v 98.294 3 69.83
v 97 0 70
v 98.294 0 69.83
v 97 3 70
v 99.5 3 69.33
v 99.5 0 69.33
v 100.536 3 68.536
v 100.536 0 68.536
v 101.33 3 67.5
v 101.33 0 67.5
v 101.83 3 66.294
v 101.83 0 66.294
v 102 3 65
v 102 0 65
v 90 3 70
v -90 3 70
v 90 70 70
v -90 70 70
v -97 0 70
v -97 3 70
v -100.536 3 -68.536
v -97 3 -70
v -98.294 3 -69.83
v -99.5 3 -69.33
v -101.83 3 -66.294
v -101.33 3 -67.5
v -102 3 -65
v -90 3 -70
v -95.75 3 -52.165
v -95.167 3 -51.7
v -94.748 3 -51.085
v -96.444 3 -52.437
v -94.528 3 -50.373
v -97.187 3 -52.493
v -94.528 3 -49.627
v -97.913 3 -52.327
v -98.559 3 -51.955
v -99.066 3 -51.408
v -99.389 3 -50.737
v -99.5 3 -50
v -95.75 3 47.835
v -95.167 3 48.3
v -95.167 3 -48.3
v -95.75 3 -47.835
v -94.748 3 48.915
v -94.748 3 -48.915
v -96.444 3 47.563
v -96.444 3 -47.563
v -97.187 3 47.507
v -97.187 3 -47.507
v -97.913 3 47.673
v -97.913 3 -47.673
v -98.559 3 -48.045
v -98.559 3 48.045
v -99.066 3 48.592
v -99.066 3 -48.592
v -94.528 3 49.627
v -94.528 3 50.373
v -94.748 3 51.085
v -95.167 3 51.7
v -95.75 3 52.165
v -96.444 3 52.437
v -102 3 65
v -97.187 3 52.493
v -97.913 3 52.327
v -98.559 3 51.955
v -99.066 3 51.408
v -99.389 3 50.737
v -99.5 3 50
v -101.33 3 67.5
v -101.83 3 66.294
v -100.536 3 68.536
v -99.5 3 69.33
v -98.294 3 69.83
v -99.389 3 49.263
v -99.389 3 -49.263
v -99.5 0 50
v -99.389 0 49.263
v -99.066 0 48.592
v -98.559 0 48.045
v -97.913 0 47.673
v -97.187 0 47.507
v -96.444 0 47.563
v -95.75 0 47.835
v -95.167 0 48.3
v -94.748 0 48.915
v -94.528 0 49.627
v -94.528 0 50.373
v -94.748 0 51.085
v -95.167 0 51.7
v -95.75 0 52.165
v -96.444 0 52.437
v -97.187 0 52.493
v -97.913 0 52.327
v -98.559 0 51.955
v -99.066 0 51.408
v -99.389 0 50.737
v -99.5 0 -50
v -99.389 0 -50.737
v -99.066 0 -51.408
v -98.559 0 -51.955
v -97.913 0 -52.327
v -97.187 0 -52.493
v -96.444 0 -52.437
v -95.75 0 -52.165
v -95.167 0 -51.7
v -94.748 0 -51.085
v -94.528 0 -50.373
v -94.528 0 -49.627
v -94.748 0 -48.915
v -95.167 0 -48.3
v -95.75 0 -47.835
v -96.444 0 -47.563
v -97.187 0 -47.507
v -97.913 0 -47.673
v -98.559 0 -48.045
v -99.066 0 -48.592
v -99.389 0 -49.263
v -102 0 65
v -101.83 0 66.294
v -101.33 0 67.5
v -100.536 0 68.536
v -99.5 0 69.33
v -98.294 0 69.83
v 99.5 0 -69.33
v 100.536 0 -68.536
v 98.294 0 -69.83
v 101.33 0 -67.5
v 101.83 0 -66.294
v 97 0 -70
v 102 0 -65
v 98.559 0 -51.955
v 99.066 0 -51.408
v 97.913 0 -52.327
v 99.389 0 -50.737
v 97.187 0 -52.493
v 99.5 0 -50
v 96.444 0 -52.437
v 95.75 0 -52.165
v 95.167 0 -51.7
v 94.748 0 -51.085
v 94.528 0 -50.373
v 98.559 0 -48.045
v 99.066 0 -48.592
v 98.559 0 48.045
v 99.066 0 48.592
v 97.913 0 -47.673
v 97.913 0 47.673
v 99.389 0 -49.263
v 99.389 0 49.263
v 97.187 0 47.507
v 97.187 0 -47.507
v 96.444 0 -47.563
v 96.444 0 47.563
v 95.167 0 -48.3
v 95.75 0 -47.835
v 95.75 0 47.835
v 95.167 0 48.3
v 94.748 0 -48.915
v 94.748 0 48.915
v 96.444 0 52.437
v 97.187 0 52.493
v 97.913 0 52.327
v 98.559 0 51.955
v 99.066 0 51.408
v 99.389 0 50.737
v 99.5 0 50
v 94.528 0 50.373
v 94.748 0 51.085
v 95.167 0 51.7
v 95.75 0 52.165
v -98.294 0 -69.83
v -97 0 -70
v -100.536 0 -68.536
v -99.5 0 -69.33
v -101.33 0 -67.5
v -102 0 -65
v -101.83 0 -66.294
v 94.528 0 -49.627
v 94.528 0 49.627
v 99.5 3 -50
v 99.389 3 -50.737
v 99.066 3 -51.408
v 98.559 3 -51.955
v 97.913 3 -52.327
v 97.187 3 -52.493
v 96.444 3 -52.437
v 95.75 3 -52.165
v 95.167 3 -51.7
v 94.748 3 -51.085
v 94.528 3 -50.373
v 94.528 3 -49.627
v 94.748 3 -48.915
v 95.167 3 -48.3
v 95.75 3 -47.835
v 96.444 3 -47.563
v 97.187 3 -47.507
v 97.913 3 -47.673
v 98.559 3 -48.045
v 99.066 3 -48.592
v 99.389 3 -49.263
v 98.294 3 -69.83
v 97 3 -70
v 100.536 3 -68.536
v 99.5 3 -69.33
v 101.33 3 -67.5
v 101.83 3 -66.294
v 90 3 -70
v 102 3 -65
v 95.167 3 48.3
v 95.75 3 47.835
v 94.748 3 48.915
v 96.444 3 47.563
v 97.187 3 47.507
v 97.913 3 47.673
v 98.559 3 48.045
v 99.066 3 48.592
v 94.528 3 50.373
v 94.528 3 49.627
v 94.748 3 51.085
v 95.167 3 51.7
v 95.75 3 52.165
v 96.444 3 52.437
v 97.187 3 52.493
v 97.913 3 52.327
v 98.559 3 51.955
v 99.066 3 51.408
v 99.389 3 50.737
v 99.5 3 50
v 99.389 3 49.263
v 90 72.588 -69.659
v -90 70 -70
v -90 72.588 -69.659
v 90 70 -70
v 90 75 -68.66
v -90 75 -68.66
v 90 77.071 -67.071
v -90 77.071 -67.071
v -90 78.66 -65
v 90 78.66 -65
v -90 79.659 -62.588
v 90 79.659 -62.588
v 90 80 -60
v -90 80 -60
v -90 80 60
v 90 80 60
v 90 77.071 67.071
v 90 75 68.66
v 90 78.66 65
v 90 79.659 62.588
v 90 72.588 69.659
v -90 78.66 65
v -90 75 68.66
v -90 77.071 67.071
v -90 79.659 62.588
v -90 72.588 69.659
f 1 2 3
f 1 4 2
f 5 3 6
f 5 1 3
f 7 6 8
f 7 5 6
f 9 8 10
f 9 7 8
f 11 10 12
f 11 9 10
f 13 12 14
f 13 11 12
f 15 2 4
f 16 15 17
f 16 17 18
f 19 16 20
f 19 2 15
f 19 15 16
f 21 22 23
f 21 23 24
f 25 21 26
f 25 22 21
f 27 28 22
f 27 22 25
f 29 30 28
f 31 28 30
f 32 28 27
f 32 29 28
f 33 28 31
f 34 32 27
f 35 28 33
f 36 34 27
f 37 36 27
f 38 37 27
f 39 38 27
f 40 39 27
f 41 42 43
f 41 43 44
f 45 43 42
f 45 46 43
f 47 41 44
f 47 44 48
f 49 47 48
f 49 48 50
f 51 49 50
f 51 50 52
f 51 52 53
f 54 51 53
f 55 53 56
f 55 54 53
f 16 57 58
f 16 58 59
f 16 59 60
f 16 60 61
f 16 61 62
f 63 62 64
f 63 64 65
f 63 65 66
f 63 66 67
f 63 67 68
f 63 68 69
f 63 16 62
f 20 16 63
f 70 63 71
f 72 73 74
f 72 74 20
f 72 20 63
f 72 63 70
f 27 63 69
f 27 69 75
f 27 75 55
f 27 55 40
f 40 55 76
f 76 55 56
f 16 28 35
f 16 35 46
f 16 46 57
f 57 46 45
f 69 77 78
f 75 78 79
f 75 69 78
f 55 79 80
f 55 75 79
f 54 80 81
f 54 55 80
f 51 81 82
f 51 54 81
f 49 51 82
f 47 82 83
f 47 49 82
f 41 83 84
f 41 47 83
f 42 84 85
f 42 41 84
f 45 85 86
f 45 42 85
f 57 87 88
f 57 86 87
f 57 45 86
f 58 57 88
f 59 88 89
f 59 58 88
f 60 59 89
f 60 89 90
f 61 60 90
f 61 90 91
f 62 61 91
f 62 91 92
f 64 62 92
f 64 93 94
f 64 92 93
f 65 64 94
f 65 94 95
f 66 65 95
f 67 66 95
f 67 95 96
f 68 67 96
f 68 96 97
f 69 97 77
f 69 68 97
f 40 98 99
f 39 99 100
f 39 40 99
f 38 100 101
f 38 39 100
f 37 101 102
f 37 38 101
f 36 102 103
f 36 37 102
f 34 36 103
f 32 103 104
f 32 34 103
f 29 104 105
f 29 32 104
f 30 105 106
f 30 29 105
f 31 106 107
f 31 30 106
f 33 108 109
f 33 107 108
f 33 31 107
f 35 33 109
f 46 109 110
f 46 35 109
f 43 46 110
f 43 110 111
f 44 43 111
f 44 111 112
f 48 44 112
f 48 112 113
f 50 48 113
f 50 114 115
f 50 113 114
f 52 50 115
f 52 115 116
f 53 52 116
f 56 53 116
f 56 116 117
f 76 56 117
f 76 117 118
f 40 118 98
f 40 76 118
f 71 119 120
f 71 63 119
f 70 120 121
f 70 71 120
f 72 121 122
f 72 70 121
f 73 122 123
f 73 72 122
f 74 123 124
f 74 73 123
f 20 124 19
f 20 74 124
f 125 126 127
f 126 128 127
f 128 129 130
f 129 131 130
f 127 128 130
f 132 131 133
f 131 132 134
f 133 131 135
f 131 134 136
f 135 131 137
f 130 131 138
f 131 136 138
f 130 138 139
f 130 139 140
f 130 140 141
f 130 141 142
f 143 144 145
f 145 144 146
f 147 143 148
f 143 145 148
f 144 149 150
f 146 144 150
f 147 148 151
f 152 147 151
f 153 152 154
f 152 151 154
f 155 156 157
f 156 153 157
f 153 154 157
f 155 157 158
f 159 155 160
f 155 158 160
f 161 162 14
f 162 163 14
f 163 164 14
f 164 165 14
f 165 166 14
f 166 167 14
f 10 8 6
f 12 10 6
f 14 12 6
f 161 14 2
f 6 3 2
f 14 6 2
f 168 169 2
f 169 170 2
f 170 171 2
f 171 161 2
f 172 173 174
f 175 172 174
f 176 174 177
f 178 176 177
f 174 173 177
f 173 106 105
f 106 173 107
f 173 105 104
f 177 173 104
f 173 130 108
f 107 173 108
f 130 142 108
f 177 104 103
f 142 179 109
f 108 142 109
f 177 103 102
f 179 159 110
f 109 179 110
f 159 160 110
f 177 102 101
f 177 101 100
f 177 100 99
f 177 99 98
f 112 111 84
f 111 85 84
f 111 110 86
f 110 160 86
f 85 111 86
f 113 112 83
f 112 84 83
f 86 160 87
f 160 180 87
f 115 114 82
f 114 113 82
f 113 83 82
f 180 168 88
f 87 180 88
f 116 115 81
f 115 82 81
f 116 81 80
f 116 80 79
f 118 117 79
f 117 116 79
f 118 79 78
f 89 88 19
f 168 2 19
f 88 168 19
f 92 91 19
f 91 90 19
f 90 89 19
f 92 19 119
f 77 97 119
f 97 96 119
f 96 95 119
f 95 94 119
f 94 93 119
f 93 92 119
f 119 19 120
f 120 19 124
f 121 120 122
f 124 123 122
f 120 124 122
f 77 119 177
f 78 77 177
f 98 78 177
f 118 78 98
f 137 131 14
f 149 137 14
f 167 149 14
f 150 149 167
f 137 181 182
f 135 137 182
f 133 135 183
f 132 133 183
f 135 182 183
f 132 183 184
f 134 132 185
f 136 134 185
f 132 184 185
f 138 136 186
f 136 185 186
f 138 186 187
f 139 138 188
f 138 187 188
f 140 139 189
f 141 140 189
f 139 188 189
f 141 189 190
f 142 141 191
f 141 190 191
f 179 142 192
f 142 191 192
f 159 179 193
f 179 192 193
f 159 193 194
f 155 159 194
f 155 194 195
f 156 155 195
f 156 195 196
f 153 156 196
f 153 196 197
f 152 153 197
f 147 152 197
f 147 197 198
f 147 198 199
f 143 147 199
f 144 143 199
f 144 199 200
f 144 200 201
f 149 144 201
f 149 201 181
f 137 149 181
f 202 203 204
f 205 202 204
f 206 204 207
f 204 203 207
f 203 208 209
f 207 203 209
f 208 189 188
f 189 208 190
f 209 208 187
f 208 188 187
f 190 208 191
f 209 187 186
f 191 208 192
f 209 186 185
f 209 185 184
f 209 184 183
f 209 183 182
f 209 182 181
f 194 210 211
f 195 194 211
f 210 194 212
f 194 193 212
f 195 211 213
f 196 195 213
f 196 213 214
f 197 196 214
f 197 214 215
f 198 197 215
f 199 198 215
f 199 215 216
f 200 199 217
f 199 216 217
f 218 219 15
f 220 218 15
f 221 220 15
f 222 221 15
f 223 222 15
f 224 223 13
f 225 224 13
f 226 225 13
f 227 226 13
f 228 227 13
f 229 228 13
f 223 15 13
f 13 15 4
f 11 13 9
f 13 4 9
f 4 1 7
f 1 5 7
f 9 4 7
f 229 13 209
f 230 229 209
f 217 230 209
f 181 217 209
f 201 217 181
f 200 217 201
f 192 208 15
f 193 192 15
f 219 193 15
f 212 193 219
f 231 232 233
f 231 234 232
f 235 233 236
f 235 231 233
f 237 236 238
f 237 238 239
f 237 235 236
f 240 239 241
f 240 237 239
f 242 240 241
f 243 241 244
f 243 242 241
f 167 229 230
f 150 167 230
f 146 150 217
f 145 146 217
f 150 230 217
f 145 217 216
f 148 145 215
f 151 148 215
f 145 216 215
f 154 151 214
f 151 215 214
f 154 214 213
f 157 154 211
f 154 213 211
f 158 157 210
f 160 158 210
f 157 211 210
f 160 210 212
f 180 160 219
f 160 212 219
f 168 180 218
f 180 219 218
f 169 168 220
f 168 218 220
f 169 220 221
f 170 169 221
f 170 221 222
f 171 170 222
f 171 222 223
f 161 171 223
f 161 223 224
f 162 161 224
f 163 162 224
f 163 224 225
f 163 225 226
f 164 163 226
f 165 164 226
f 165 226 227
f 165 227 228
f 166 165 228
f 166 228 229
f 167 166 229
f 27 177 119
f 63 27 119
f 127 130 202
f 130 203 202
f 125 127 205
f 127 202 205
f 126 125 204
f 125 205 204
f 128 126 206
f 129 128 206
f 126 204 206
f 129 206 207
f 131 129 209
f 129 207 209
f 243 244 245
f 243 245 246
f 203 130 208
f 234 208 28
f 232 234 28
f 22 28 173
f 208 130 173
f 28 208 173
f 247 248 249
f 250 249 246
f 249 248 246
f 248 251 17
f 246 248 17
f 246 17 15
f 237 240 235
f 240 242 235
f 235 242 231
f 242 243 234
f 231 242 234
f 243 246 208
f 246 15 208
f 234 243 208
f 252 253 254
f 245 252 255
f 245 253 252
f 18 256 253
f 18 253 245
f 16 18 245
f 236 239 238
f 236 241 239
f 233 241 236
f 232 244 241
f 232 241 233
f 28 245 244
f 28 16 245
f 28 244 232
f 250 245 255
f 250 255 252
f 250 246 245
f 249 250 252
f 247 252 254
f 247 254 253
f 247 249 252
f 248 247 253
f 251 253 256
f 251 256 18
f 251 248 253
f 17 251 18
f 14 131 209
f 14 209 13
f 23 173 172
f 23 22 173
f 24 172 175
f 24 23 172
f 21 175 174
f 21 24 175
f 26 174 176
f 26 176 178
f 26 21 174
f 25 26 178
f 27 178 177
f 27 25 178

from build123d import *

# Parameters (mm, degrees)
CROQUIS1_W               = 180
CROQUIS1_H               = 140
SALIENTE_EXTRUIR1_DEPTH  = 80
CROQUIS2_W               = 12
CROQUIS2_H               = 140
SALIENTE_EXTRUIR2_DEPTH  = 3
REDONDEO1_R              = 5
CROQUIS3_R               = 2.5
CORTAR_EXTRUIR1_DEPTH    = 4
REDONDEO1_OF_SIMETR_A1_R = 5
REDONDEO2_R              = 10


with BuildPart() as part:
    # Croquis1 → Saliente-Extruir1 (new body)
    with BuildSketch(Plane(origin=(0, 0, 0), x_dir=(1, 0, 0), z_dir=(0, 1, 0))):
        Rectangle(CROQUIS1_W, CROQUIS1_H)
    extrude(amount=SALIENTE_EXTRUIR1_DEPTH)

    # Croquis2 → Saliente-Extruir2 (add)
    with BuildSketch(Plane.XZ):
        with Locations((96, 0)):
            Rectangle(CROQUIS2_W, CROQUIS2_H)
    saliente_extruir2 = extrude(amount=-SALIENTE_EXTRUIR2_DEPTH)

    # Redondeo1
    redondeo1_edges = [part.edges().sort_by_distance(p)[0] for p in [
        (102, 1.5, 70),
        (102, 1.5, -70),
    ]]
    fillet(redondeo1_edges, radius=REDONDEO1_R)

    # Croquis3 → Cortar-Extruir1 (cut, through all)
    with BuildSketch(Plane(origin=(0, 3, 0), x_dir=(1, 0, 0), z_dir=(0, 1, 0))):
        with Locations((97, 50)):
            Circle(CROQUIS3_R)
        with Locations((97, -50)):
            Circle(CROQUIS3_R)
    cortar_extruir1 = extrude(amount=-CORTAR_EXTRUIR1_DEPTH, mode=Mode.SUBTRACT)

    # Simetría1: Saliente-Extruir2, Cortar-Extruir1 across plane
    add(saliente_extruir2.mirror(Plane(origin=(0, 0, 0), x_dir=(0, 0, 1), z_dir=(1, 0, 0))))
    add(cortar_extruir1.mirror(Plane(origin=(0, 0, 0), x_dir=(0, 0, 1), z_dir=(1, 0, 0))), mode=Mode.SUBTRACT)

    # Redondeo1 of Simetría1
    redondeo1_of_simetr_a1_edges = [part.edges().sort_by_distance(p)[0] for p in [
        (-102, 1.5, 70),
        (-102, 1.5, -70),
    ]]
    fillet(redondeo1_of_simetr_a1_edges, radius=REDONDEO1_OF_SIMETR_A1_R)

    # Redondeo2
    redondeo2_edges = [part.edges().sort_by_distance(p)[0] for p in [
        (0, 80, 70),
        (0, 80, -70),
    ]]
    fillet(redondeo2_edges, radius=REDONDEO2_R)


solid = part.part
